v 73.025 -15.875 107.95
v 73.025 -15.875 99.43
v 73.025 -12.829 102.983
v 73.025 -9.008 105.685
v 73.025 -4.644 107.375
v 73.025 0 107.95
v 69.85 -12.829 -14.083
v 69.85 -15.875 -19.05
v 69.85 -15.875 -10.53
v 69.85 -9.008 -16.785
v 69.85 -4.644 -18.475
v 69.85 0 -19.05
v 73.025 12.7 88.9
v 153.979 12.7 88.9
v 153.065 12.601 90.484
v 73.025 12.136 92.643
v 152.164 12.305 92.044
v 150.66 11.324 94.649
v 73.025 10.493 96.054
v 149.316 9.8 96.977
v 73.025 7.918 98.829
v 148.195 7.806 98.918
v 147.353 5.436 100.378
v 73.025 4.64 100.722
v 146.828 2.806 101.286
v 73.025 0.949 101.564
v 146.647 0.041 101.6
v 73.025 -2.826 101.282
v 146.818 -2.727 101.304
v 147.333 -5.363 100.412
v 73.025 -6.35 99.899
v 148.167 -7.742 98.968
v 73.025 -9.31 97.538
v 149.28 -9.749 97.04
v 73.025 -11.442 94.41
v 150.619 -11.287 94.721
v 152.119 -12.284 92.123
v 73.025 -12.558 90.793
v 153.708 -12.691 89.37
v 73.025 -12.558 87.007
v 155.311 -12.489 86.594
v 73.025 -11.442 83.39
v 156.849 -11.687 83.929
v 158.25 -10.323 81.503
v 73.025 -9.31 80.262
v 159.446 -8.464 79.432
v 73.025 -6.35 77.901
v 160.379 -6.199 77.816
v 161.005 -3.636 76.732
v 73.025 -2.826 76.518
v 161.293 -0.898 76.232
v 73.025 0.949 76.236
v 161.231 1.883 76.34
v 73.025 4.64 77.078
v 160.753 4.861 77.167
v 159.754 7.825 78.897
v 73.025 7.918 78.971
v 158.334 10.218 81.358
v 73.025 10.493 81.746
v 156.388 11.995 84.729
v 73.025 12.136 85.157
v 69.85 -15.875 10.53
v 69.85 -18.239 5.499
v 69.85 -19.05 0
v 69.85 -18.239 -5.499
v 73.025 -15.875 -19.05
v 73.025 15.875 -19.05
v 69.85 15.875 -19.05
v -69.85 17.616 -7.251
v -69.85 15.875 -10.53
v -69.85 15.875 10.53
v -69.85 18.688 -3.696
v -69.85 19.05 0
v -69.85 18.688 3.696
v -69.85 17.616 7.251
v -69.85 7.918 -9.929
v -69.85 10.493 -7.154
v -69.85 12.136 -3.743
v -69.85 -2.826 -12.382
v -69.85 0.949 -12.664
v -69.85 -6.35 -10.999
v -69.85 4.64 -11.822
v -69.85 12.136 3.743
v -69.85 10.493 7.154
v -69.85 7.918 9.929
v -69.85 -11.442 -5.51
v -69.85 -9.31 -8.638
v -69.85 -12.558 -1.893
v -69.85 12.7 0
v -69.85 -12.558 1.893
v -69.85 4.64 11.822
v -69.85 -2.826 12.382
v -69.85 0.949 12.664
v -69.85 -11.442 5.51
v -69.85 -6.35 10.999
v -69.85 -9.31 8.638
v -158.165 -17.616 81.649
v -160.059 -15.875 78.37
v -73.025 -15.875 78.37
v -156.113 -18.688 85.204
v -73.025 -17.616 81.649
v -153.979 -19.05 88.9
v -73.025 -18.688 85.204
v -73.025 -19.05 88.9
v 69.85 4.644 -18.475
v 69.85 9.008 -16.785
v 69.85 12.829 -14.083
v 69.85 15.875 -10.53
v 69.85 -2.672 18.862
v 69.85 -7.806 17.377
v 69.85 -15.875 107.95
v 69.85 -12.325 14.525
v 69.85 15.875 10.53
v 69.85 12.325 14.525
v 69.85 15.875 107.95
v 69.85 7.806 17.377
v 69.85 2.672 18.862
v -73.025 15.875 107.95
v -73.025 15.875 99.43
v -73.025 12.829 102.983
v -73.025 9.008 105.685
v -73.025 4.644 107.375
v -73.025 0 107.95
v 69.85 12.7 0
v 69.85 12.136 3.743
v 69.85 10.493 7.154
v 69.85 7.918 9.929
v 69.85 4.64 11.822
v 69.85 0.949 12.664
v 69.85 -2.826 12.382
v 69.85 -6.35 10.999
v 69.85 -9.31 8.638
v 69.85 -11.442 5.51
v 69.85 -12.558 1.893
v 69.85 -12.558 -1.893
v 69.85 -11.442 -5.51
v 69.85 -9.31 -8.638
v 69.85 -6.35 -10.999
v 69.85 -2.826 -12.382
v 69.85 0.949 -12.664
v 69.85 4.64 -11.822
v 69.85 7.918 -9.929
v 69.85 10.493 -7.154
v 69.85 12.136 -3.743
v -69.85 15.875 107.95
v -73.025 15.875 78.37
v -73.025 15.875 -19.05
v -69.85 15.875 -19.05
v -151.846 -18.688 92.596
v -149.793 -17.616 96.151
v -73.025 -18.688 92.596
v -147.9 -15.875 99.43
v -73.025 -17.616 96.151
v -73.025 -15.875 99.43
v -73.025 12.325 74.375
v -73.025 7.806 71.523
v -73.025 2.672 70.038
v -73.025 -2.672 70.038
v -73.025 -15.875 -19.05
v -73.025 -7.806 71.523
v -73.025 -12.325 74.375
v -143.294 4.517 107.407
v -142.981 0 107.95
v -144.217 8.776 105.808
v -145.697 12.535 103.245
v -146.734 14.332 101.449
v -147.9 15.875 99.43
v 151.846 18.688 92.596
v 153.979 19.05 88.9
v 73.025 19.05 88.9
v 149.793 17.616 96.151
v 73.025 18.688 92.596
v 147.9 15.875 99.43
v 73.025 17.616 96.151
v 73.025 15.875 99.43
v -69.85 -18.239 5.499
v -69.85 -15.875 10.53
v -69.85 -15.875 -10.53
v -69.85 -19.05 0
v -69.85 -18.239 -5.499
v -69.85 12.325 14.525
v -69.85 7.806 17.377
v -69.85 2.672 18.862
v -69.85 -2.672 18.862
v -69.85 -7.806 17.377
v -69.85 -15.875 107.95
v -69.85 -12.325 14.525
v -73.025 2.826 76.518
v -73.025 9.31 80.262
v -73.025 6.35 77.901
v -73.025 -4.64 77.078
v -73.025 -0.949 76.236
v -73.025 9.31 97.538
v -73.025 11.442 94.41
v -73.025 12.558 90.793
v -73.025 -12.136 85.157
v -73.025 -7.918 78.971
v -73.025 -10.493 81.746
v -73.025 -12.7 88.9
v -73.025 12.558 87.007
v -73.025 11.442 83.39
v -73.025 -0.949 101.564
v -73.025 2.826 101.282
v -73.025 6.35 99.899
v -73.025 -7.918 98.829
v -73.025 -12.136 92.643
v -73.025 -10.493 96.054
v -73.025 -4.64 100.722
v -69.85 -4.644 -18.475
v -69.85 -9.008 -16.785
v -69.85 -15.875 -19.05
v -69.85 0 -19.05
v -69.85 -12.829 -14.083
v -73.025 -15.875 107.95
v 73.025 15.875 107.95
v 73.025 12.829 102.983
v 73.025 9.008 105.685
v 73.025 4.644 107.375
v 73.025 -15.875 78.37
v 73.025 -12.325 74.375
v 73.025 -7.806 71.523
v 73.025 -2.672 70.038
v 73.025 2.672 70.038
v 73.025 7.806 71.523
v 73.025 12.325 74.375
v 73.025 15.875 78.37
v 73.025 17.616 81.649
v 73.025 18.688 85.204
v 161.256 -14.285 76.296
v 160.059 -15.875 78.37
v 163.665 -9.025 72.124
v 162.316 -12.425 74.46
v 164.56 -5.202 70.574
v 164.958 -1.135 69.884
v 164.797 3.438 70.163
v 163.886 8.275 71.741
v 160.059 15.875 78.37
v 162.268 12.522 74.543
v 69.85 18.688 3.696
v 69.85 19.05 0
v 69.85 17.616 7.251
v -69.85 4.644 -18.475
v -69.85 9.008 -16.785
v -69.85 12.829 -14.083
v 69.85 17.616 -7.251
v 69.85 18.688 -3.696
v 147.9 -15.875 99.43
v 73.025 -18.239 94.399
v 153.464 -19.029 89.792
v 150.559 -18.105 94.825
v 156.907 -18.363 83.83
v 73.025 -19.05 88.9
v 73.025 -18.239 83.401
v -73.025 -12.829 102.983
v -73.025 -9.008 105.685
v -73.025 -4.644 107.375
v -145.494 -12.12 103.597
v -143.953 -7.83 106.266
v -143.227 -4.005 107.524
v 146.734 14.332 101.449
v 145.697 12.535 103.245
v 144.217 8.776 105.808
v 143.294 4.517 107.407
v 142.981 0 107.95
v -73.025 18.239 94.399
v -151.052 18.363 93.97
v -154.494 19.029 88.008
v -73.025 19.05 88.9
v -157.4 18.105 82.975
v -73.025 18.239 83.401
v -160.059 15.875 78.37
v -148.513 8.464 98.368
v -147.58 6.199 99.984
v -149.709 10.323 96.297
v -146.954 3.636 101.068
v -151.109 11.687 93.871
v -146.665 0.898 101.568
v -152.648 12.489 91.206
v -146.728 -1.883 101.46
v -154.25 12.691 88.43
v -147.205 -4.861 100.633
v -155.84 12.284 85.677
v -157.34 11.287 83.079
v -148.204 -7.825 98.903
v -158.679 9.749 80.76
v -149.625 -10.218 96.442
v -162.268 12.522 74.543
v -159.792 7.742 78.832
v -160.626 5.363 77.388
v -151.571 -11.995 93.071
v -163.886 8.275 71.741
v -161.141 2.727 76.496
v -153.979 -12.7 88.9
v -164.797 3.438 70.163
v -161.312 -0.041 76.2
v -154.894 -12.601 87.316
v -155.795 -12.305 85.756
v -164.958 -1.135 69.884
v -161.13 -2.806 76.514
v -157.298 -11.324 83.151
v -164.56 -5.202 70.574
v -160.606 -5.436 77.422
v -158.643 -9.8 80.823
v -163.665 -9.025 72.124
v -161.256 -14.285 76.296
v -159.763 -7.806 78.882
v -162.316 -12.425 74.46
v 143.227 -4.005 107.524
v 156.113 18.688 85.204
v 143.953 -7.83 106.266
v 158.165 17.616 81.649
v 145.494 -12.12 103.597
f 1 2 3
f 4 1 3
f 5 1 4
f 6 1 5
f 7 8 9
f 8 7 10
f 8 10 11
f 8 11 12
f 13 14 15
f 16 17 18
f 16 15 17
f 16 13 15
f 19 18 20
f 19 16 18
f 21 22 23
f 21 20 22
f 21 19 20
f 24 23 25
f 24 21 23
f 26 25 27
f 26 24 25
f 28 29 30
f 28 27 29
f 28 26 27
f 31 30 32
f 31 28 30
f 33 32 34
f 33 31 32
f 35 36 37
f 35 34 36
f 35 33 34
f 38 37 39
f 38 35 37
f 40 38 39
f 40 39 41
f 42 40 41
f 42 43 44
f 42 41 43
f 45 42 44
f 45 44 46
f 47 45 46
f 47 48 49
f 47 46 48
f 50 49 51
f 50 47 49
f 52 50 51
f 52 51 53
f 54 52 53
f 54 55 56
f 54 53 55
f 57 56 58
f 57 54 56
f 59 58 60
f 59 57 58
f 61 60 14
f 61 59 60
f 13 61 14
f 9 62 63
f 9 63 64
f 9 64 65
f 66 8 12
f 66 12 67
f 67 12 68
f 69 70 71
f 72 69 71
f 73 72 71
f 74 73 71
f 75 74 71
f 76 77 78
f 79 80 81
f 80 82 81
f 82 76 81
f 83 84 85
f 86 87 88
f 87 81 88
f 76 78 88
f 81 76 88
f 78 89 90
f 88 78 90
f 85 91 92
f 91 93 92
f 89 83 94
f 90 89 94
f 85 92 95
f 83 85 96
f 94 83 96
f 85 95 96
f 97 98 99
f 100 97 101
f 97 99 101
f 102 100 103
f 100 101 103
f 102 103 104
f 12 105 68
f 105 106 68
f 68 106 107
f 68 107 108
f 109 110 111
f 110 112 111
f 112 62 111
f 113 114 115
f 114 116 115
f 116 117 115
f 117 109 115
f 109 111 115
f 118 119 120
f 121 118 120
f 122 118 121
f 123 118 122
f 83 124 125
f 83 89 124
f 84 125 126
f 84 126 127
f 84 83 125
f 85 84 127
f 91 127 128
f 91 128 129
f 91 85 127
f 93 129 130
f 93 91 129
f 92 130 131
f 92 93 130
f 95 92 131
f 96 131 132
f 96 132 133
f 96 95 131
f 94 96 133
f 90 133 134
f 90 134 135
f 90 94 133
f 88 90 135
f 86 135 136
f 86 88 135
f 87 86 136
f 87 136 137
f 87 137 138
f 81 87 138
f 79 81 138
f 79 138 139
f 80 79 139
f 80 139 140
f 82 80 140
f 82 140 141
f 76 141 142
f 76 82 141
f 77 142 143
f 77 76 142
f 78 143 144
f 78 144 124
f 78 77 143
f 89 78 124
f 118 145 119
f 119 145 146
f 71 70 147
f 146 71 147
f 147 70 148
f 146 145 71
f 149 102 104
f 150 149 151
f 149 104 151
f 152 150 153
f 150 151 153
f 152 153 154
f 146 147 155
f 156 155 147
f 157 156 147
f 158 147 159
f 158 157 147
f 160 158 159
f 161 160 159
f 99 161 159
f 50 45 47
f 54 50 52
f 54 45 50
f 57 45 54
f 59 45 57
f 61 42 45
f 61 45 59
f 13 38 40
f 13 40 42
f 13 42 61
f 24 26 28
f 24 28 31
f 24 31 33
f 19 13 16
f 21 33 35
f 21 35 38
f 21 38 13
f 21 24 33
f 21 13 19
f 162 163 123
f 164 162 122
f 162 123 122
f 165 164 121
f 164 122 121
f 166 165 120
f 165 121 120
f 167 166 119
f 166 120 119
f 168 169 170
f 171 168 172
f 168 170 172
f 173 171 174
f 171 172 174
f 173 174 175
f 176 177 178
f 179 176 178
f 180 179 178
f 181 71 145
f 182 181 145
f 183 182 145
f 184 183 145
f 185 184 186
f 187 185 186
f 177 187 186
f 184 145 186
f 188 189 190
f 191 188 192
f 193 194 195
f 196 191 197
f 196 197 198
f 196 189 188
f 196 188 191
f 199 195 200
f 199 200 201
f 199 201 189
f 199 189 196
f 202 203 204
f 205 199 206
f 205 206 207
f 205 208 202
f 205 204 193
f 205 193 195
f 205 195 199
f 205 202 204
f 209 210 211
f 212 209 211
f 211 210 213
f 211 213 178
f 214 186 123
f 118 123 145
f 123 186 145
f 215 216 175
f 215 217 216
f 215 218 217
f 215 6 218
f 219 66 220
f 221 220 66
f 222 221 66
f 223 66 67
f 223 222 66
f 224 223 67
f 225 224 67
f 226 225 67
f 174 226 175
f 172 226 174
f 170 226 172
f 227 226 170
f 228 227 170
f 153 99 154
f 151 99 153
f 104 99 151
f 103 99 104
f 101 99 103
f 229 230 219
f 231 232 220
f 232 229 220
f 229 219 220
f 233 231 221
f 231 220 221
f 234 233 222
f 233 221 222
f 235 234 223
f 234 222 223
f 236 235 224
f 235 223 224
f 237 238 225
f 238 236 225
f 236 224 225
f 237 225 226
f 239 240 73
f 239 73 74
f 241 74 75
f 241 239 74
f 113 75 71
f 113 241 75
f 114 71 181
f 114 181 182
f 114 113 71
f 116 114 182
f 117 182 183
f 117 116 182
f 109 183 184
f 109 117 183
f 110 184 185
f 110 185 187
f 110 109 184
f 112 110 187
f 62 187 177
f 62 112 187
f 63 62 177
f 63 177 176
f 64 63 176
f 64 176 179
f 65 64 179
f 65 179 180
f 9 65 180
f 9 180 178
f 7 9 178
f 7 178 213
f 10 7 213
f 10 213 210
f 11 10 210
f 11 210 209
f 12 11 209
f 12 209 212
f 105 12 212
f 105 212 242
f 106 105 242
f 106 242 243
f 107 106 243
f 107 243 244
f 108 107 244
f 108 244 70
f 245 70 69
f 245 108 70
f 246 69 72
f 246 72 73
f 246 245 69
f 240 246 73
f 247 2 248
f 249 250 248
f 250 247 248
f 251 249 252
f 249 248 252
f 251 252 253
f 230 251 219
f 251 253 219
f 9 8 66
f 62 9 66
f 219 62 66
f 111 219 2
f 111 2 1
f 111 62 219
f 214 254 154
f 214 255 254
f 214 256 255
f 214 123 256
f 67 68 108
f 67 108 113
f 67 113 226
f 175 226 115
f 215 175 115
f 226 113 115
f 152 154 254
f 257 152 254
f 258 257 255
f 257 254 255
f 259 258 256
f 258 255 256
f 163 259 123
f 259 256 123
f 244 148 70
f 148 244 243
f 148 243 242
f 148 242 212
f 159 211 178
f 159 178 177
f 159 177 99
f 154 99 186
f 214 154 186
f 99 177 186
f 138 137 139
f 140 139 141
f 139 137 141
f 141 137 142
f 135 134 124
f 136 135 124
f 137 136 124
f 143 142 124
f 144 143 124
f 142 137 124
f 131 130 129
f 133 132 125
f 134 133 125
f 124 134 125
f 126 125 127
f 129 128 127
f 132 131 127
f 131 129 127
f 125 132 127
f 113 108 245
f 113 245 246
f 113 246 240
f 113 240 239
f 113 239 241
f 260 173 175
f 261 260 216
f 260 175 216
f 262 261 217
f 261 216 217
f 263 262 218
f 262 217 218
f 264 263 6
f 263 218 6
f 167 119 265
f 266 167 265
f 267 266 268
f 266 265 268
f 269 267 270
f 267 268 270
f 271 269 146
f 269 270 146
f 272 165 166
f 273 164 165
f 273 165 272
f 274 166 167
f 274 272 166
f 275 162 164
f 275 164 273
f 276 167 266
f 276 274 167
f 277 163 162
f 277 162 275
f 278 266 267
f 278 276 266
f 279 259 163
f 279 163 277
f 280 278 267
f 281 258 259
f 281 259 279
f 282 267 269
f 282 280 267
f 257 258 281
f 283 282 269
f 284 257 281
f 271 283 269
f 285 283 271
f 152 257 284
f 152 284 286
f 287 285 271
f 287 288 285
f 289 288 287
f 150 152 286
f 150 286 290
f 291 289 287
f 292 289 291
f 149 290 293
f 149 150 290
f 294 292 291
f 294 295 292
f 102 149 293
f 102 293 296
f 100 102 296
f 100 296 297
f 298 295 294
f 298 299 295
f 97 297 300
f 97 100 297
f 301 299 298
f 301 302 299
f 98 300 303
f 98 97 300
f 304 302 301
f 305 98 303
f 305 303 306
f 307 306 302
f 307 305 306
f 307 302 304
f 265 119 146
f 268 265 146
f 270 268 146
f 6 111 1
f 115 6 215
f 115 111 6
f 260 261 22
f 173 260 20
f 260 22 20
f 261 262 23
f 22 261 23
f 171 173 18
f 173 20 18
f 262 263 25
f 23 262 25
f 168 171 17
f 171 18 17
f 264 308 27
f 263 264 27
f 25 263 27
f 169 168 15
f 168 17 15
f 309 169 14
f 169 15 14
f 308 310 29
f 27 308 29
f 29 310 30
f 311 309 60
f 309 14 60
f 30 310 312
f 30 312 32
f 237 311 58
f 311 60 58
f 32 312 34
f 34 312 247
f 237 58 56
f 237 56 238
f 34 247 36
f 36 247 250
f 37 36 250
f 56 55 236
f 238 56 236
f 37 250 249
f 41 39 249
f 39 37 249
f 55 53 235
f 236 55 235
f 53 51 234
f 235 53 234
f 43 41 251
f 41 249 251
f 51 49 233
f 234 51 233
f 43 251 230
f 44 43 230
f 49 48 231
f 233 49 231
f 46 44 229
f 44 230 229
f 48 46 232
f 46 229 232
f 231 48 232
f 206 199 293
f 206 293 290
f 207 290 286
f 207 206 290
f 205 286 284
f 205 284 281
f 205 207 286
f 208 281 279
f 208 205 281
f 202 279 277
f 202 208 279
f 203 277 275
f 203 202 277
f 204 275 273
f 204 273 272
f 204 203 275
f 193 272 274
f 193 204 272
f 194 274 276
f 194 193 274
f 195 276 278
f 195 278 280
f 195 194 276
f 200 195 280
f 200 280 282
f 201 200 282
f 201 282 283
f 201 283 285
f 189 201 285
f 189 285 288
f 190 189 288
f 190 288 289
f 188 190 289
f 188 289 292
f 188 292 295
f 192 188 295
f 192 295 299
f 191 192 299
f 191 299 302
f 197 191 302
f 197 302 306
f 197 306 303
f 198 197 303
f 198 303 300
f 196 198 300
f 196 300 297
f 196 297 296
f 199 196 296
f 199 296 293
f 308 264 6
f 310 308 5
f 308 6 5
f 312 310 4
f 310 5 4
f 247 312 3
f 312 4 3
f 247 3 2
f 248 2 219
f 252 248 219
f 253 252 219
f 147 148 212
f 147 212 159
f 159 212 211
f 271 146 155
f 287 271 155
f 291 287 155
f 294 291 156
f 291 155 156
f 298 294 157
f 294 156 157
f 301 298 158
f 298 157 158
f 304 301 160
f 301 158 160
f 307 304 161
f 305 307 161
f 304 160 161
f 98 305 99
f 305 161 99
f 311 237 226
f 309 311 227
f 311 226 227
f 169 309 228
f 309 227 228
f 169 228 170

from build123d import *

# Parameters (mm, degrees)
F0_R         = 19.05
F0_R_2       = 12.7
F2_DEPTH     = 69.85
F3_W         = 31.75
F3_H         = 127
F4_DEPTH     = 3.175
F5_R         = 12.7
F6_DEPTH     = 101.6
F7_R         = 12.7
F8_DEPTH     = 3.175
F9_R         = 12.7
F10_DEPTH    = 101.6
F6_FACE_R    = 19.05
F6_FACE_R_2  = 12.7
F13_REACH    = 74.5272199335
F10_FACE_R   = 19.05
F10_FACE_R_2 = 12.7
F14_REACH    = 74.5272199335


with BuildPart() as f2:
    # F0 (on Right) → F2 (new body, symmetric)
    with BuildSketch(Plane.YZ):
        Circle(F0_R)
        Circle(F0_R_2, mode=Mode.SUBTRACT)
    extrude(amount=F2_DEPTH, both=True)

    # F3 (on face) → F4 (join)
    with BuildSketch(Plane.YZ.offset(69.85)):
        with Locations((0, 44.45)):
            Rectangle(F3_W, F3_H)
    extrude(amount=F4_DEPTH)

    # F5 (on face) → F6 (join)
    with BuildSketch(Plane.YZ.offset(73.025)):
        with BuildLine():
            Line((15.875, 78.3697162906), (15.875, 99.4302837094))
            ThreePointArc((15.875, 99.4302837094), (9.0083459795, 105.6854759454), (-4.82e-08, 107.95))
            ThreePointArc((-4.82e-08, 107.95), (-9.0083460219, 105.6854759226), (-15.875, 99.4302837094))
            Line((-15.875, 99.4302837094), (-15.875, 78.3697162906))
            ThreePointArc((-15.875, 78.3697162906), (0, 69.85), (15.875, 78.3697162906))
        make_face()
        with Locations((0, 88.9)):
            Circle(F5_R, mode=Mode.SUBTRACT)
        with BuildLine():
            ThreePointArc((-15.875, 99.4302837094), (-19.05, 88.9), (-15.875, 78.3697162906))
            Line((-15.875, 78.3697162906), (-15.875, 99.4302837094))
        make_face()
        with BuildLine():
            ThreePointArc((15.875, 78.3697162906), (18.2389864028, 83.400738686), (19.05, 88.9))
            ThreePointArc((19.05, 88.9), (18.2389864028, 94.399261314), (15.875, 99.4302837094))
            Line((15.875, 99.4302837094), (15.875, 78.3697162906))
        make_face()
    extrude(amount=F6_DEPTH)

    # F7 (on face) → F8 (join)
    with BuildSketch(Plane(origin=(-69.85, 0, 0), x_dir=(0, -1, 0), z_dir=(-1, 0, 0))):
        with BuildLine():
            ThreePointArc((-15.875, 10.5302837094), (0, 19.05), (15.875, 10.5302837094))
            Line((15.875, 10.5302837094), (15.875, 107.95))
            Line((15.875, 107.95), (-15.875, 107.95))
            Line((-15.875, 107.95), (-15.875, 10.5302837094))
        make_face()
        with BuildLine():
            ThreePointArc((-15.875, -10.5302837094), (-9.0083460007, -16.785475934), (0, -19.05))
            ThreePointArc((0, -19.05), (9.0083460007, -16.785475934), (15.875, -10.5302837094))
            Line((15.875, -10.5302837094), (15.875, 10.5302837094))
            ThreePointArc((15.875, 10.5302837094), (0, 19.05), (-15.875, 10.5302837094))
            Line((-15.875, 10.5302837094), (-15.875, -10.5302837094))
        make_face()
        Circle(F7_R, mode=Mode.SUBTRACT)
        Circle(F7_R)
        with BuildLine():
            Line((0, -19.05), (15.875, -19.05))
            Line((15.875, -19.05), (15.875, -10.5302837094))
            ThreePointArc((15.875, -10.5302837094), (9.0083460007, -16.785475934), (0, -19.05))
        make_face()
        with BuildLine():
            Line((-15.875, -19.05), (0, -19.05))
            ThreePointArc((0, -19.05), (-9.0083460007, -16.785475934), (-15.875, -10.5302837094))
            Line((-15.875, -10.5302837094), (-15.875, -19.05))
        make_face()
    extrude(amount=F8_DEPTH)

    # F9 (on face) → F10 (join)
    with BuildSketch(Plane(origin=(-73.025, 0, 0), x_dir=(0, -1, 0), z_dir=(-1, 0, 0))):
        with BuildLine():
            Line((15.875, 78.3697162906), (15.875, 99.4302837094))
            ThreePointArc((15.875, 99.4302837094), (9.0083459795, 105.6854759454), (-4.82e-08, 107.95))
            ThreePointArc((-4.82e-08, 107.95), (-9.0083460219, 105.6854759226), (-15.875, 99.4302837094))
            Line((-15.875, 99.4302837094), (-15.875, 78.3697162906))
            ThreePointArc((-15.875, 78.3697162906), (0, 69.85), (15.875, 78.3697162906))
        make_face()
        with Locations((0, 88.9)):
            Circle(F9_R, mode=Mode.SUBTRACT)
        with BuildLine():
            ThreePointArc((15.875, 78.3697162906), (18.2389864028, 83.400738686), (19.05, 88.9))
            ThreePointArc((19.05, 88.9), (18.2389864028, 94.399261314), (15.875, 99.4302837094))
            Line((15.875, 99.4302837094), (15.875, 78.3697162906))
        make_face()
        with BuildLine():
            ThreePointArc((-15.875, 99.4302837094), (-19.05, 88.9), (-15.875, 78.3697162906))
            Line((-15.875, 78.3697162906), (-15.875, 99.4302837094))
        make_face()
    extrude(amount=F10_DEPTH)

    f13_end = Plane(origin=(153.9793167929, 0, 88.9), x_dir=(0.5, 0, -0.8660254038), z_dir=(-0.8660254038, 0, -0.5))
    # F6_face (on face) → F13 (cut, up to a plane its end follows)
    with BuildSketch(Plane(origin=(174.625, 0, 88.9), x_dir=(0, 1, 0), z_dir=(1, 0, 0))):
        Circle(F6_FACE_R)
        Circle(F6_FACE_R_2, mode=Mode.SUBTRACT)
    f13_long = extrude(amount=-F13_REACH, mode=Mode.PRIVATE)
    add(split(f13_long, bisect_by=f13_end, keep=Keep.BOTTOM, mode=Mode.PRIVATE), mode=Mode.SUBTRACT)

    f14_end = Plane(origin=(-153.9793167929, 0, 88.9), x_dir=(-0.5, 0, -0.8660254038), z_dir=(-0.8660254038, 0, 0.5))
    # F10_face (on face) → F14 (cut, up to a plane its end follows)
    with BuildSketch(Plane(origin=(-174.625, 0, 88.9), x_dir=(0, -1, 0), z_dir=(-1, 0, 0))):
        Circle(F10_FACE_R)
        Circle(F10_FACE_R_2, mode=Mode.SUBTRACT)
    f14_long = extrude(amount=-F14_REACH, mode=Mode.PRIVATE)
    add(split(f14_long, bisect_by=f14_end, keep=Keep.TOP, mode=Mode.PRIVATE), mode=Mode.SUBTRACT)


solid = f2.part
